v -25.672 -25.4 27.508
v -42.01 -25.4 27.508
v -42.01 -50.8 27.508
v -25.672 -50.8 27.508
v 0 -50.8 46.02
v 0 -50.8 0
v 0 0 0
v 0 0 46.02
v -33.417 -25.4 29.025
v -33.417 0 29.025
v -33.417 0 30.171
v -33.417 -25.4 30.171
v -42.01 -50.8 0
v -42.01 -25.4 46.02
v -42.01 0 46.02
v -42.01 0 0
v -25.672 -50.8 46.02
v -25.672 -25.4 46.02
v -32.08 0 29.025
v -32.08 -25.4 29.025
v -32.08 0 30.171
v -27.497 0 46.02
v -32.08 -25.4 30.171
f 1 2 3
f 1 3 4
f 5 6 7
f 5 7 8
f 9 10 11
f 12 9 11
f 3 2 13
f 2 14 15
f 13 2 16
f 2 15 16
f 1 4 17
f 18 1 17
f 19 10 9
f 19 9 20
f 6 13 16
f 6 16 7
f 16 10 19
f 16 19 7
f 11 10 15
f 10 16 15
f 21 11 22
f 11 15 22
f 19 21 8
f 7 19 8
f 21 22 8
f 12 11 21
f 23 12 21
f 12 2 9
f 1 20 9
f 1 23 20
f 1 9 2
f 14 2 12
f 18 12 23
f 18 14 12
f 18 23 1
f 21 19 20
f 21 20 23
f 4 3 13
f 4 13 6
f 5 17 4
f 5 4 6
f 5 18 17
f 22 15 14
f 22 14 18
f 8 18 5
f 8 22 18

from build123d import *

# Parameters (mm, degrees)
F0_W     = 14.5125519484
F0_H     = 18.9045108855
F0_W_2   = 1.3366825879
F0_H_2   = 1.1457279325
F1_DEPTH = 50.8
F2_DEPTH = 50.8
F3_W     = 16.3383670151
F3_H     = 18.5120366514
F3_W_2   = 1.3366825879
F3_H_2   = 1.1457279325
F4_DEPTH = 25.4


with BuildPart() as f1:
    # F0 (on Front) → F1 (new body)
    with BuildSketch(Plane.XZ):
        Polygon((-42.0100241899, 0), (0, 0), (0, 46.0200719535), (-27.4974722415, 46.0200719535), (-27.4974722415, 27.1155610681), (-42.0100241899, 27.1155610681), align=None)
        with Locations((-34.7537482157, 36.5678165108)):
            Rectangle(F0_W, F0_H)
        with Locations((-32.7487234026, 29.5979715884)):
            Rectangle(F0_W_2, F0_H_2, mode=Mode.SUBTRACT)
    extrude(amount=F1_DEPTH)

    # F0 (on Front) → F2 (join)
    with BuildSketch(Plane.XZ):
        Polygon((-42.0100241899, 0), (0, 0), (0, 46.0200719535), (-27.4974722415, 46.0200719535), (-27.4974722415, 27.1155610681), (-42.0100241899, 27.1155610681), align=None)
        with Locations((-34.7537482157, 36.5678165108)):
            Rectangle(F0_W, F0_H)
        with Locations((-32.7487234026, 29.5979715884)):
            Rectangle(F0_W_2, F0_H_2, mode=Mode.SUBTRACT)
    extrude(amount=F2_DEPTH)

    # F3 (on face) → F4 (cut)
    with BuildSketch(Plane.XZ.offset(50.8)):
        with Locations((-33.8408406824, 36.7640536278)):
            Rectangle(F3_W, F3_H)
        with Locations((-32.7487234026, 29.5979715884)):
            Rectangle(F3_W_2, F3_H_2, mode=Mode.SUBTRACT)
    extrude(amount=-F4_DEPTH, mode=Mode.SUBTRACT)


solid = f1.part
